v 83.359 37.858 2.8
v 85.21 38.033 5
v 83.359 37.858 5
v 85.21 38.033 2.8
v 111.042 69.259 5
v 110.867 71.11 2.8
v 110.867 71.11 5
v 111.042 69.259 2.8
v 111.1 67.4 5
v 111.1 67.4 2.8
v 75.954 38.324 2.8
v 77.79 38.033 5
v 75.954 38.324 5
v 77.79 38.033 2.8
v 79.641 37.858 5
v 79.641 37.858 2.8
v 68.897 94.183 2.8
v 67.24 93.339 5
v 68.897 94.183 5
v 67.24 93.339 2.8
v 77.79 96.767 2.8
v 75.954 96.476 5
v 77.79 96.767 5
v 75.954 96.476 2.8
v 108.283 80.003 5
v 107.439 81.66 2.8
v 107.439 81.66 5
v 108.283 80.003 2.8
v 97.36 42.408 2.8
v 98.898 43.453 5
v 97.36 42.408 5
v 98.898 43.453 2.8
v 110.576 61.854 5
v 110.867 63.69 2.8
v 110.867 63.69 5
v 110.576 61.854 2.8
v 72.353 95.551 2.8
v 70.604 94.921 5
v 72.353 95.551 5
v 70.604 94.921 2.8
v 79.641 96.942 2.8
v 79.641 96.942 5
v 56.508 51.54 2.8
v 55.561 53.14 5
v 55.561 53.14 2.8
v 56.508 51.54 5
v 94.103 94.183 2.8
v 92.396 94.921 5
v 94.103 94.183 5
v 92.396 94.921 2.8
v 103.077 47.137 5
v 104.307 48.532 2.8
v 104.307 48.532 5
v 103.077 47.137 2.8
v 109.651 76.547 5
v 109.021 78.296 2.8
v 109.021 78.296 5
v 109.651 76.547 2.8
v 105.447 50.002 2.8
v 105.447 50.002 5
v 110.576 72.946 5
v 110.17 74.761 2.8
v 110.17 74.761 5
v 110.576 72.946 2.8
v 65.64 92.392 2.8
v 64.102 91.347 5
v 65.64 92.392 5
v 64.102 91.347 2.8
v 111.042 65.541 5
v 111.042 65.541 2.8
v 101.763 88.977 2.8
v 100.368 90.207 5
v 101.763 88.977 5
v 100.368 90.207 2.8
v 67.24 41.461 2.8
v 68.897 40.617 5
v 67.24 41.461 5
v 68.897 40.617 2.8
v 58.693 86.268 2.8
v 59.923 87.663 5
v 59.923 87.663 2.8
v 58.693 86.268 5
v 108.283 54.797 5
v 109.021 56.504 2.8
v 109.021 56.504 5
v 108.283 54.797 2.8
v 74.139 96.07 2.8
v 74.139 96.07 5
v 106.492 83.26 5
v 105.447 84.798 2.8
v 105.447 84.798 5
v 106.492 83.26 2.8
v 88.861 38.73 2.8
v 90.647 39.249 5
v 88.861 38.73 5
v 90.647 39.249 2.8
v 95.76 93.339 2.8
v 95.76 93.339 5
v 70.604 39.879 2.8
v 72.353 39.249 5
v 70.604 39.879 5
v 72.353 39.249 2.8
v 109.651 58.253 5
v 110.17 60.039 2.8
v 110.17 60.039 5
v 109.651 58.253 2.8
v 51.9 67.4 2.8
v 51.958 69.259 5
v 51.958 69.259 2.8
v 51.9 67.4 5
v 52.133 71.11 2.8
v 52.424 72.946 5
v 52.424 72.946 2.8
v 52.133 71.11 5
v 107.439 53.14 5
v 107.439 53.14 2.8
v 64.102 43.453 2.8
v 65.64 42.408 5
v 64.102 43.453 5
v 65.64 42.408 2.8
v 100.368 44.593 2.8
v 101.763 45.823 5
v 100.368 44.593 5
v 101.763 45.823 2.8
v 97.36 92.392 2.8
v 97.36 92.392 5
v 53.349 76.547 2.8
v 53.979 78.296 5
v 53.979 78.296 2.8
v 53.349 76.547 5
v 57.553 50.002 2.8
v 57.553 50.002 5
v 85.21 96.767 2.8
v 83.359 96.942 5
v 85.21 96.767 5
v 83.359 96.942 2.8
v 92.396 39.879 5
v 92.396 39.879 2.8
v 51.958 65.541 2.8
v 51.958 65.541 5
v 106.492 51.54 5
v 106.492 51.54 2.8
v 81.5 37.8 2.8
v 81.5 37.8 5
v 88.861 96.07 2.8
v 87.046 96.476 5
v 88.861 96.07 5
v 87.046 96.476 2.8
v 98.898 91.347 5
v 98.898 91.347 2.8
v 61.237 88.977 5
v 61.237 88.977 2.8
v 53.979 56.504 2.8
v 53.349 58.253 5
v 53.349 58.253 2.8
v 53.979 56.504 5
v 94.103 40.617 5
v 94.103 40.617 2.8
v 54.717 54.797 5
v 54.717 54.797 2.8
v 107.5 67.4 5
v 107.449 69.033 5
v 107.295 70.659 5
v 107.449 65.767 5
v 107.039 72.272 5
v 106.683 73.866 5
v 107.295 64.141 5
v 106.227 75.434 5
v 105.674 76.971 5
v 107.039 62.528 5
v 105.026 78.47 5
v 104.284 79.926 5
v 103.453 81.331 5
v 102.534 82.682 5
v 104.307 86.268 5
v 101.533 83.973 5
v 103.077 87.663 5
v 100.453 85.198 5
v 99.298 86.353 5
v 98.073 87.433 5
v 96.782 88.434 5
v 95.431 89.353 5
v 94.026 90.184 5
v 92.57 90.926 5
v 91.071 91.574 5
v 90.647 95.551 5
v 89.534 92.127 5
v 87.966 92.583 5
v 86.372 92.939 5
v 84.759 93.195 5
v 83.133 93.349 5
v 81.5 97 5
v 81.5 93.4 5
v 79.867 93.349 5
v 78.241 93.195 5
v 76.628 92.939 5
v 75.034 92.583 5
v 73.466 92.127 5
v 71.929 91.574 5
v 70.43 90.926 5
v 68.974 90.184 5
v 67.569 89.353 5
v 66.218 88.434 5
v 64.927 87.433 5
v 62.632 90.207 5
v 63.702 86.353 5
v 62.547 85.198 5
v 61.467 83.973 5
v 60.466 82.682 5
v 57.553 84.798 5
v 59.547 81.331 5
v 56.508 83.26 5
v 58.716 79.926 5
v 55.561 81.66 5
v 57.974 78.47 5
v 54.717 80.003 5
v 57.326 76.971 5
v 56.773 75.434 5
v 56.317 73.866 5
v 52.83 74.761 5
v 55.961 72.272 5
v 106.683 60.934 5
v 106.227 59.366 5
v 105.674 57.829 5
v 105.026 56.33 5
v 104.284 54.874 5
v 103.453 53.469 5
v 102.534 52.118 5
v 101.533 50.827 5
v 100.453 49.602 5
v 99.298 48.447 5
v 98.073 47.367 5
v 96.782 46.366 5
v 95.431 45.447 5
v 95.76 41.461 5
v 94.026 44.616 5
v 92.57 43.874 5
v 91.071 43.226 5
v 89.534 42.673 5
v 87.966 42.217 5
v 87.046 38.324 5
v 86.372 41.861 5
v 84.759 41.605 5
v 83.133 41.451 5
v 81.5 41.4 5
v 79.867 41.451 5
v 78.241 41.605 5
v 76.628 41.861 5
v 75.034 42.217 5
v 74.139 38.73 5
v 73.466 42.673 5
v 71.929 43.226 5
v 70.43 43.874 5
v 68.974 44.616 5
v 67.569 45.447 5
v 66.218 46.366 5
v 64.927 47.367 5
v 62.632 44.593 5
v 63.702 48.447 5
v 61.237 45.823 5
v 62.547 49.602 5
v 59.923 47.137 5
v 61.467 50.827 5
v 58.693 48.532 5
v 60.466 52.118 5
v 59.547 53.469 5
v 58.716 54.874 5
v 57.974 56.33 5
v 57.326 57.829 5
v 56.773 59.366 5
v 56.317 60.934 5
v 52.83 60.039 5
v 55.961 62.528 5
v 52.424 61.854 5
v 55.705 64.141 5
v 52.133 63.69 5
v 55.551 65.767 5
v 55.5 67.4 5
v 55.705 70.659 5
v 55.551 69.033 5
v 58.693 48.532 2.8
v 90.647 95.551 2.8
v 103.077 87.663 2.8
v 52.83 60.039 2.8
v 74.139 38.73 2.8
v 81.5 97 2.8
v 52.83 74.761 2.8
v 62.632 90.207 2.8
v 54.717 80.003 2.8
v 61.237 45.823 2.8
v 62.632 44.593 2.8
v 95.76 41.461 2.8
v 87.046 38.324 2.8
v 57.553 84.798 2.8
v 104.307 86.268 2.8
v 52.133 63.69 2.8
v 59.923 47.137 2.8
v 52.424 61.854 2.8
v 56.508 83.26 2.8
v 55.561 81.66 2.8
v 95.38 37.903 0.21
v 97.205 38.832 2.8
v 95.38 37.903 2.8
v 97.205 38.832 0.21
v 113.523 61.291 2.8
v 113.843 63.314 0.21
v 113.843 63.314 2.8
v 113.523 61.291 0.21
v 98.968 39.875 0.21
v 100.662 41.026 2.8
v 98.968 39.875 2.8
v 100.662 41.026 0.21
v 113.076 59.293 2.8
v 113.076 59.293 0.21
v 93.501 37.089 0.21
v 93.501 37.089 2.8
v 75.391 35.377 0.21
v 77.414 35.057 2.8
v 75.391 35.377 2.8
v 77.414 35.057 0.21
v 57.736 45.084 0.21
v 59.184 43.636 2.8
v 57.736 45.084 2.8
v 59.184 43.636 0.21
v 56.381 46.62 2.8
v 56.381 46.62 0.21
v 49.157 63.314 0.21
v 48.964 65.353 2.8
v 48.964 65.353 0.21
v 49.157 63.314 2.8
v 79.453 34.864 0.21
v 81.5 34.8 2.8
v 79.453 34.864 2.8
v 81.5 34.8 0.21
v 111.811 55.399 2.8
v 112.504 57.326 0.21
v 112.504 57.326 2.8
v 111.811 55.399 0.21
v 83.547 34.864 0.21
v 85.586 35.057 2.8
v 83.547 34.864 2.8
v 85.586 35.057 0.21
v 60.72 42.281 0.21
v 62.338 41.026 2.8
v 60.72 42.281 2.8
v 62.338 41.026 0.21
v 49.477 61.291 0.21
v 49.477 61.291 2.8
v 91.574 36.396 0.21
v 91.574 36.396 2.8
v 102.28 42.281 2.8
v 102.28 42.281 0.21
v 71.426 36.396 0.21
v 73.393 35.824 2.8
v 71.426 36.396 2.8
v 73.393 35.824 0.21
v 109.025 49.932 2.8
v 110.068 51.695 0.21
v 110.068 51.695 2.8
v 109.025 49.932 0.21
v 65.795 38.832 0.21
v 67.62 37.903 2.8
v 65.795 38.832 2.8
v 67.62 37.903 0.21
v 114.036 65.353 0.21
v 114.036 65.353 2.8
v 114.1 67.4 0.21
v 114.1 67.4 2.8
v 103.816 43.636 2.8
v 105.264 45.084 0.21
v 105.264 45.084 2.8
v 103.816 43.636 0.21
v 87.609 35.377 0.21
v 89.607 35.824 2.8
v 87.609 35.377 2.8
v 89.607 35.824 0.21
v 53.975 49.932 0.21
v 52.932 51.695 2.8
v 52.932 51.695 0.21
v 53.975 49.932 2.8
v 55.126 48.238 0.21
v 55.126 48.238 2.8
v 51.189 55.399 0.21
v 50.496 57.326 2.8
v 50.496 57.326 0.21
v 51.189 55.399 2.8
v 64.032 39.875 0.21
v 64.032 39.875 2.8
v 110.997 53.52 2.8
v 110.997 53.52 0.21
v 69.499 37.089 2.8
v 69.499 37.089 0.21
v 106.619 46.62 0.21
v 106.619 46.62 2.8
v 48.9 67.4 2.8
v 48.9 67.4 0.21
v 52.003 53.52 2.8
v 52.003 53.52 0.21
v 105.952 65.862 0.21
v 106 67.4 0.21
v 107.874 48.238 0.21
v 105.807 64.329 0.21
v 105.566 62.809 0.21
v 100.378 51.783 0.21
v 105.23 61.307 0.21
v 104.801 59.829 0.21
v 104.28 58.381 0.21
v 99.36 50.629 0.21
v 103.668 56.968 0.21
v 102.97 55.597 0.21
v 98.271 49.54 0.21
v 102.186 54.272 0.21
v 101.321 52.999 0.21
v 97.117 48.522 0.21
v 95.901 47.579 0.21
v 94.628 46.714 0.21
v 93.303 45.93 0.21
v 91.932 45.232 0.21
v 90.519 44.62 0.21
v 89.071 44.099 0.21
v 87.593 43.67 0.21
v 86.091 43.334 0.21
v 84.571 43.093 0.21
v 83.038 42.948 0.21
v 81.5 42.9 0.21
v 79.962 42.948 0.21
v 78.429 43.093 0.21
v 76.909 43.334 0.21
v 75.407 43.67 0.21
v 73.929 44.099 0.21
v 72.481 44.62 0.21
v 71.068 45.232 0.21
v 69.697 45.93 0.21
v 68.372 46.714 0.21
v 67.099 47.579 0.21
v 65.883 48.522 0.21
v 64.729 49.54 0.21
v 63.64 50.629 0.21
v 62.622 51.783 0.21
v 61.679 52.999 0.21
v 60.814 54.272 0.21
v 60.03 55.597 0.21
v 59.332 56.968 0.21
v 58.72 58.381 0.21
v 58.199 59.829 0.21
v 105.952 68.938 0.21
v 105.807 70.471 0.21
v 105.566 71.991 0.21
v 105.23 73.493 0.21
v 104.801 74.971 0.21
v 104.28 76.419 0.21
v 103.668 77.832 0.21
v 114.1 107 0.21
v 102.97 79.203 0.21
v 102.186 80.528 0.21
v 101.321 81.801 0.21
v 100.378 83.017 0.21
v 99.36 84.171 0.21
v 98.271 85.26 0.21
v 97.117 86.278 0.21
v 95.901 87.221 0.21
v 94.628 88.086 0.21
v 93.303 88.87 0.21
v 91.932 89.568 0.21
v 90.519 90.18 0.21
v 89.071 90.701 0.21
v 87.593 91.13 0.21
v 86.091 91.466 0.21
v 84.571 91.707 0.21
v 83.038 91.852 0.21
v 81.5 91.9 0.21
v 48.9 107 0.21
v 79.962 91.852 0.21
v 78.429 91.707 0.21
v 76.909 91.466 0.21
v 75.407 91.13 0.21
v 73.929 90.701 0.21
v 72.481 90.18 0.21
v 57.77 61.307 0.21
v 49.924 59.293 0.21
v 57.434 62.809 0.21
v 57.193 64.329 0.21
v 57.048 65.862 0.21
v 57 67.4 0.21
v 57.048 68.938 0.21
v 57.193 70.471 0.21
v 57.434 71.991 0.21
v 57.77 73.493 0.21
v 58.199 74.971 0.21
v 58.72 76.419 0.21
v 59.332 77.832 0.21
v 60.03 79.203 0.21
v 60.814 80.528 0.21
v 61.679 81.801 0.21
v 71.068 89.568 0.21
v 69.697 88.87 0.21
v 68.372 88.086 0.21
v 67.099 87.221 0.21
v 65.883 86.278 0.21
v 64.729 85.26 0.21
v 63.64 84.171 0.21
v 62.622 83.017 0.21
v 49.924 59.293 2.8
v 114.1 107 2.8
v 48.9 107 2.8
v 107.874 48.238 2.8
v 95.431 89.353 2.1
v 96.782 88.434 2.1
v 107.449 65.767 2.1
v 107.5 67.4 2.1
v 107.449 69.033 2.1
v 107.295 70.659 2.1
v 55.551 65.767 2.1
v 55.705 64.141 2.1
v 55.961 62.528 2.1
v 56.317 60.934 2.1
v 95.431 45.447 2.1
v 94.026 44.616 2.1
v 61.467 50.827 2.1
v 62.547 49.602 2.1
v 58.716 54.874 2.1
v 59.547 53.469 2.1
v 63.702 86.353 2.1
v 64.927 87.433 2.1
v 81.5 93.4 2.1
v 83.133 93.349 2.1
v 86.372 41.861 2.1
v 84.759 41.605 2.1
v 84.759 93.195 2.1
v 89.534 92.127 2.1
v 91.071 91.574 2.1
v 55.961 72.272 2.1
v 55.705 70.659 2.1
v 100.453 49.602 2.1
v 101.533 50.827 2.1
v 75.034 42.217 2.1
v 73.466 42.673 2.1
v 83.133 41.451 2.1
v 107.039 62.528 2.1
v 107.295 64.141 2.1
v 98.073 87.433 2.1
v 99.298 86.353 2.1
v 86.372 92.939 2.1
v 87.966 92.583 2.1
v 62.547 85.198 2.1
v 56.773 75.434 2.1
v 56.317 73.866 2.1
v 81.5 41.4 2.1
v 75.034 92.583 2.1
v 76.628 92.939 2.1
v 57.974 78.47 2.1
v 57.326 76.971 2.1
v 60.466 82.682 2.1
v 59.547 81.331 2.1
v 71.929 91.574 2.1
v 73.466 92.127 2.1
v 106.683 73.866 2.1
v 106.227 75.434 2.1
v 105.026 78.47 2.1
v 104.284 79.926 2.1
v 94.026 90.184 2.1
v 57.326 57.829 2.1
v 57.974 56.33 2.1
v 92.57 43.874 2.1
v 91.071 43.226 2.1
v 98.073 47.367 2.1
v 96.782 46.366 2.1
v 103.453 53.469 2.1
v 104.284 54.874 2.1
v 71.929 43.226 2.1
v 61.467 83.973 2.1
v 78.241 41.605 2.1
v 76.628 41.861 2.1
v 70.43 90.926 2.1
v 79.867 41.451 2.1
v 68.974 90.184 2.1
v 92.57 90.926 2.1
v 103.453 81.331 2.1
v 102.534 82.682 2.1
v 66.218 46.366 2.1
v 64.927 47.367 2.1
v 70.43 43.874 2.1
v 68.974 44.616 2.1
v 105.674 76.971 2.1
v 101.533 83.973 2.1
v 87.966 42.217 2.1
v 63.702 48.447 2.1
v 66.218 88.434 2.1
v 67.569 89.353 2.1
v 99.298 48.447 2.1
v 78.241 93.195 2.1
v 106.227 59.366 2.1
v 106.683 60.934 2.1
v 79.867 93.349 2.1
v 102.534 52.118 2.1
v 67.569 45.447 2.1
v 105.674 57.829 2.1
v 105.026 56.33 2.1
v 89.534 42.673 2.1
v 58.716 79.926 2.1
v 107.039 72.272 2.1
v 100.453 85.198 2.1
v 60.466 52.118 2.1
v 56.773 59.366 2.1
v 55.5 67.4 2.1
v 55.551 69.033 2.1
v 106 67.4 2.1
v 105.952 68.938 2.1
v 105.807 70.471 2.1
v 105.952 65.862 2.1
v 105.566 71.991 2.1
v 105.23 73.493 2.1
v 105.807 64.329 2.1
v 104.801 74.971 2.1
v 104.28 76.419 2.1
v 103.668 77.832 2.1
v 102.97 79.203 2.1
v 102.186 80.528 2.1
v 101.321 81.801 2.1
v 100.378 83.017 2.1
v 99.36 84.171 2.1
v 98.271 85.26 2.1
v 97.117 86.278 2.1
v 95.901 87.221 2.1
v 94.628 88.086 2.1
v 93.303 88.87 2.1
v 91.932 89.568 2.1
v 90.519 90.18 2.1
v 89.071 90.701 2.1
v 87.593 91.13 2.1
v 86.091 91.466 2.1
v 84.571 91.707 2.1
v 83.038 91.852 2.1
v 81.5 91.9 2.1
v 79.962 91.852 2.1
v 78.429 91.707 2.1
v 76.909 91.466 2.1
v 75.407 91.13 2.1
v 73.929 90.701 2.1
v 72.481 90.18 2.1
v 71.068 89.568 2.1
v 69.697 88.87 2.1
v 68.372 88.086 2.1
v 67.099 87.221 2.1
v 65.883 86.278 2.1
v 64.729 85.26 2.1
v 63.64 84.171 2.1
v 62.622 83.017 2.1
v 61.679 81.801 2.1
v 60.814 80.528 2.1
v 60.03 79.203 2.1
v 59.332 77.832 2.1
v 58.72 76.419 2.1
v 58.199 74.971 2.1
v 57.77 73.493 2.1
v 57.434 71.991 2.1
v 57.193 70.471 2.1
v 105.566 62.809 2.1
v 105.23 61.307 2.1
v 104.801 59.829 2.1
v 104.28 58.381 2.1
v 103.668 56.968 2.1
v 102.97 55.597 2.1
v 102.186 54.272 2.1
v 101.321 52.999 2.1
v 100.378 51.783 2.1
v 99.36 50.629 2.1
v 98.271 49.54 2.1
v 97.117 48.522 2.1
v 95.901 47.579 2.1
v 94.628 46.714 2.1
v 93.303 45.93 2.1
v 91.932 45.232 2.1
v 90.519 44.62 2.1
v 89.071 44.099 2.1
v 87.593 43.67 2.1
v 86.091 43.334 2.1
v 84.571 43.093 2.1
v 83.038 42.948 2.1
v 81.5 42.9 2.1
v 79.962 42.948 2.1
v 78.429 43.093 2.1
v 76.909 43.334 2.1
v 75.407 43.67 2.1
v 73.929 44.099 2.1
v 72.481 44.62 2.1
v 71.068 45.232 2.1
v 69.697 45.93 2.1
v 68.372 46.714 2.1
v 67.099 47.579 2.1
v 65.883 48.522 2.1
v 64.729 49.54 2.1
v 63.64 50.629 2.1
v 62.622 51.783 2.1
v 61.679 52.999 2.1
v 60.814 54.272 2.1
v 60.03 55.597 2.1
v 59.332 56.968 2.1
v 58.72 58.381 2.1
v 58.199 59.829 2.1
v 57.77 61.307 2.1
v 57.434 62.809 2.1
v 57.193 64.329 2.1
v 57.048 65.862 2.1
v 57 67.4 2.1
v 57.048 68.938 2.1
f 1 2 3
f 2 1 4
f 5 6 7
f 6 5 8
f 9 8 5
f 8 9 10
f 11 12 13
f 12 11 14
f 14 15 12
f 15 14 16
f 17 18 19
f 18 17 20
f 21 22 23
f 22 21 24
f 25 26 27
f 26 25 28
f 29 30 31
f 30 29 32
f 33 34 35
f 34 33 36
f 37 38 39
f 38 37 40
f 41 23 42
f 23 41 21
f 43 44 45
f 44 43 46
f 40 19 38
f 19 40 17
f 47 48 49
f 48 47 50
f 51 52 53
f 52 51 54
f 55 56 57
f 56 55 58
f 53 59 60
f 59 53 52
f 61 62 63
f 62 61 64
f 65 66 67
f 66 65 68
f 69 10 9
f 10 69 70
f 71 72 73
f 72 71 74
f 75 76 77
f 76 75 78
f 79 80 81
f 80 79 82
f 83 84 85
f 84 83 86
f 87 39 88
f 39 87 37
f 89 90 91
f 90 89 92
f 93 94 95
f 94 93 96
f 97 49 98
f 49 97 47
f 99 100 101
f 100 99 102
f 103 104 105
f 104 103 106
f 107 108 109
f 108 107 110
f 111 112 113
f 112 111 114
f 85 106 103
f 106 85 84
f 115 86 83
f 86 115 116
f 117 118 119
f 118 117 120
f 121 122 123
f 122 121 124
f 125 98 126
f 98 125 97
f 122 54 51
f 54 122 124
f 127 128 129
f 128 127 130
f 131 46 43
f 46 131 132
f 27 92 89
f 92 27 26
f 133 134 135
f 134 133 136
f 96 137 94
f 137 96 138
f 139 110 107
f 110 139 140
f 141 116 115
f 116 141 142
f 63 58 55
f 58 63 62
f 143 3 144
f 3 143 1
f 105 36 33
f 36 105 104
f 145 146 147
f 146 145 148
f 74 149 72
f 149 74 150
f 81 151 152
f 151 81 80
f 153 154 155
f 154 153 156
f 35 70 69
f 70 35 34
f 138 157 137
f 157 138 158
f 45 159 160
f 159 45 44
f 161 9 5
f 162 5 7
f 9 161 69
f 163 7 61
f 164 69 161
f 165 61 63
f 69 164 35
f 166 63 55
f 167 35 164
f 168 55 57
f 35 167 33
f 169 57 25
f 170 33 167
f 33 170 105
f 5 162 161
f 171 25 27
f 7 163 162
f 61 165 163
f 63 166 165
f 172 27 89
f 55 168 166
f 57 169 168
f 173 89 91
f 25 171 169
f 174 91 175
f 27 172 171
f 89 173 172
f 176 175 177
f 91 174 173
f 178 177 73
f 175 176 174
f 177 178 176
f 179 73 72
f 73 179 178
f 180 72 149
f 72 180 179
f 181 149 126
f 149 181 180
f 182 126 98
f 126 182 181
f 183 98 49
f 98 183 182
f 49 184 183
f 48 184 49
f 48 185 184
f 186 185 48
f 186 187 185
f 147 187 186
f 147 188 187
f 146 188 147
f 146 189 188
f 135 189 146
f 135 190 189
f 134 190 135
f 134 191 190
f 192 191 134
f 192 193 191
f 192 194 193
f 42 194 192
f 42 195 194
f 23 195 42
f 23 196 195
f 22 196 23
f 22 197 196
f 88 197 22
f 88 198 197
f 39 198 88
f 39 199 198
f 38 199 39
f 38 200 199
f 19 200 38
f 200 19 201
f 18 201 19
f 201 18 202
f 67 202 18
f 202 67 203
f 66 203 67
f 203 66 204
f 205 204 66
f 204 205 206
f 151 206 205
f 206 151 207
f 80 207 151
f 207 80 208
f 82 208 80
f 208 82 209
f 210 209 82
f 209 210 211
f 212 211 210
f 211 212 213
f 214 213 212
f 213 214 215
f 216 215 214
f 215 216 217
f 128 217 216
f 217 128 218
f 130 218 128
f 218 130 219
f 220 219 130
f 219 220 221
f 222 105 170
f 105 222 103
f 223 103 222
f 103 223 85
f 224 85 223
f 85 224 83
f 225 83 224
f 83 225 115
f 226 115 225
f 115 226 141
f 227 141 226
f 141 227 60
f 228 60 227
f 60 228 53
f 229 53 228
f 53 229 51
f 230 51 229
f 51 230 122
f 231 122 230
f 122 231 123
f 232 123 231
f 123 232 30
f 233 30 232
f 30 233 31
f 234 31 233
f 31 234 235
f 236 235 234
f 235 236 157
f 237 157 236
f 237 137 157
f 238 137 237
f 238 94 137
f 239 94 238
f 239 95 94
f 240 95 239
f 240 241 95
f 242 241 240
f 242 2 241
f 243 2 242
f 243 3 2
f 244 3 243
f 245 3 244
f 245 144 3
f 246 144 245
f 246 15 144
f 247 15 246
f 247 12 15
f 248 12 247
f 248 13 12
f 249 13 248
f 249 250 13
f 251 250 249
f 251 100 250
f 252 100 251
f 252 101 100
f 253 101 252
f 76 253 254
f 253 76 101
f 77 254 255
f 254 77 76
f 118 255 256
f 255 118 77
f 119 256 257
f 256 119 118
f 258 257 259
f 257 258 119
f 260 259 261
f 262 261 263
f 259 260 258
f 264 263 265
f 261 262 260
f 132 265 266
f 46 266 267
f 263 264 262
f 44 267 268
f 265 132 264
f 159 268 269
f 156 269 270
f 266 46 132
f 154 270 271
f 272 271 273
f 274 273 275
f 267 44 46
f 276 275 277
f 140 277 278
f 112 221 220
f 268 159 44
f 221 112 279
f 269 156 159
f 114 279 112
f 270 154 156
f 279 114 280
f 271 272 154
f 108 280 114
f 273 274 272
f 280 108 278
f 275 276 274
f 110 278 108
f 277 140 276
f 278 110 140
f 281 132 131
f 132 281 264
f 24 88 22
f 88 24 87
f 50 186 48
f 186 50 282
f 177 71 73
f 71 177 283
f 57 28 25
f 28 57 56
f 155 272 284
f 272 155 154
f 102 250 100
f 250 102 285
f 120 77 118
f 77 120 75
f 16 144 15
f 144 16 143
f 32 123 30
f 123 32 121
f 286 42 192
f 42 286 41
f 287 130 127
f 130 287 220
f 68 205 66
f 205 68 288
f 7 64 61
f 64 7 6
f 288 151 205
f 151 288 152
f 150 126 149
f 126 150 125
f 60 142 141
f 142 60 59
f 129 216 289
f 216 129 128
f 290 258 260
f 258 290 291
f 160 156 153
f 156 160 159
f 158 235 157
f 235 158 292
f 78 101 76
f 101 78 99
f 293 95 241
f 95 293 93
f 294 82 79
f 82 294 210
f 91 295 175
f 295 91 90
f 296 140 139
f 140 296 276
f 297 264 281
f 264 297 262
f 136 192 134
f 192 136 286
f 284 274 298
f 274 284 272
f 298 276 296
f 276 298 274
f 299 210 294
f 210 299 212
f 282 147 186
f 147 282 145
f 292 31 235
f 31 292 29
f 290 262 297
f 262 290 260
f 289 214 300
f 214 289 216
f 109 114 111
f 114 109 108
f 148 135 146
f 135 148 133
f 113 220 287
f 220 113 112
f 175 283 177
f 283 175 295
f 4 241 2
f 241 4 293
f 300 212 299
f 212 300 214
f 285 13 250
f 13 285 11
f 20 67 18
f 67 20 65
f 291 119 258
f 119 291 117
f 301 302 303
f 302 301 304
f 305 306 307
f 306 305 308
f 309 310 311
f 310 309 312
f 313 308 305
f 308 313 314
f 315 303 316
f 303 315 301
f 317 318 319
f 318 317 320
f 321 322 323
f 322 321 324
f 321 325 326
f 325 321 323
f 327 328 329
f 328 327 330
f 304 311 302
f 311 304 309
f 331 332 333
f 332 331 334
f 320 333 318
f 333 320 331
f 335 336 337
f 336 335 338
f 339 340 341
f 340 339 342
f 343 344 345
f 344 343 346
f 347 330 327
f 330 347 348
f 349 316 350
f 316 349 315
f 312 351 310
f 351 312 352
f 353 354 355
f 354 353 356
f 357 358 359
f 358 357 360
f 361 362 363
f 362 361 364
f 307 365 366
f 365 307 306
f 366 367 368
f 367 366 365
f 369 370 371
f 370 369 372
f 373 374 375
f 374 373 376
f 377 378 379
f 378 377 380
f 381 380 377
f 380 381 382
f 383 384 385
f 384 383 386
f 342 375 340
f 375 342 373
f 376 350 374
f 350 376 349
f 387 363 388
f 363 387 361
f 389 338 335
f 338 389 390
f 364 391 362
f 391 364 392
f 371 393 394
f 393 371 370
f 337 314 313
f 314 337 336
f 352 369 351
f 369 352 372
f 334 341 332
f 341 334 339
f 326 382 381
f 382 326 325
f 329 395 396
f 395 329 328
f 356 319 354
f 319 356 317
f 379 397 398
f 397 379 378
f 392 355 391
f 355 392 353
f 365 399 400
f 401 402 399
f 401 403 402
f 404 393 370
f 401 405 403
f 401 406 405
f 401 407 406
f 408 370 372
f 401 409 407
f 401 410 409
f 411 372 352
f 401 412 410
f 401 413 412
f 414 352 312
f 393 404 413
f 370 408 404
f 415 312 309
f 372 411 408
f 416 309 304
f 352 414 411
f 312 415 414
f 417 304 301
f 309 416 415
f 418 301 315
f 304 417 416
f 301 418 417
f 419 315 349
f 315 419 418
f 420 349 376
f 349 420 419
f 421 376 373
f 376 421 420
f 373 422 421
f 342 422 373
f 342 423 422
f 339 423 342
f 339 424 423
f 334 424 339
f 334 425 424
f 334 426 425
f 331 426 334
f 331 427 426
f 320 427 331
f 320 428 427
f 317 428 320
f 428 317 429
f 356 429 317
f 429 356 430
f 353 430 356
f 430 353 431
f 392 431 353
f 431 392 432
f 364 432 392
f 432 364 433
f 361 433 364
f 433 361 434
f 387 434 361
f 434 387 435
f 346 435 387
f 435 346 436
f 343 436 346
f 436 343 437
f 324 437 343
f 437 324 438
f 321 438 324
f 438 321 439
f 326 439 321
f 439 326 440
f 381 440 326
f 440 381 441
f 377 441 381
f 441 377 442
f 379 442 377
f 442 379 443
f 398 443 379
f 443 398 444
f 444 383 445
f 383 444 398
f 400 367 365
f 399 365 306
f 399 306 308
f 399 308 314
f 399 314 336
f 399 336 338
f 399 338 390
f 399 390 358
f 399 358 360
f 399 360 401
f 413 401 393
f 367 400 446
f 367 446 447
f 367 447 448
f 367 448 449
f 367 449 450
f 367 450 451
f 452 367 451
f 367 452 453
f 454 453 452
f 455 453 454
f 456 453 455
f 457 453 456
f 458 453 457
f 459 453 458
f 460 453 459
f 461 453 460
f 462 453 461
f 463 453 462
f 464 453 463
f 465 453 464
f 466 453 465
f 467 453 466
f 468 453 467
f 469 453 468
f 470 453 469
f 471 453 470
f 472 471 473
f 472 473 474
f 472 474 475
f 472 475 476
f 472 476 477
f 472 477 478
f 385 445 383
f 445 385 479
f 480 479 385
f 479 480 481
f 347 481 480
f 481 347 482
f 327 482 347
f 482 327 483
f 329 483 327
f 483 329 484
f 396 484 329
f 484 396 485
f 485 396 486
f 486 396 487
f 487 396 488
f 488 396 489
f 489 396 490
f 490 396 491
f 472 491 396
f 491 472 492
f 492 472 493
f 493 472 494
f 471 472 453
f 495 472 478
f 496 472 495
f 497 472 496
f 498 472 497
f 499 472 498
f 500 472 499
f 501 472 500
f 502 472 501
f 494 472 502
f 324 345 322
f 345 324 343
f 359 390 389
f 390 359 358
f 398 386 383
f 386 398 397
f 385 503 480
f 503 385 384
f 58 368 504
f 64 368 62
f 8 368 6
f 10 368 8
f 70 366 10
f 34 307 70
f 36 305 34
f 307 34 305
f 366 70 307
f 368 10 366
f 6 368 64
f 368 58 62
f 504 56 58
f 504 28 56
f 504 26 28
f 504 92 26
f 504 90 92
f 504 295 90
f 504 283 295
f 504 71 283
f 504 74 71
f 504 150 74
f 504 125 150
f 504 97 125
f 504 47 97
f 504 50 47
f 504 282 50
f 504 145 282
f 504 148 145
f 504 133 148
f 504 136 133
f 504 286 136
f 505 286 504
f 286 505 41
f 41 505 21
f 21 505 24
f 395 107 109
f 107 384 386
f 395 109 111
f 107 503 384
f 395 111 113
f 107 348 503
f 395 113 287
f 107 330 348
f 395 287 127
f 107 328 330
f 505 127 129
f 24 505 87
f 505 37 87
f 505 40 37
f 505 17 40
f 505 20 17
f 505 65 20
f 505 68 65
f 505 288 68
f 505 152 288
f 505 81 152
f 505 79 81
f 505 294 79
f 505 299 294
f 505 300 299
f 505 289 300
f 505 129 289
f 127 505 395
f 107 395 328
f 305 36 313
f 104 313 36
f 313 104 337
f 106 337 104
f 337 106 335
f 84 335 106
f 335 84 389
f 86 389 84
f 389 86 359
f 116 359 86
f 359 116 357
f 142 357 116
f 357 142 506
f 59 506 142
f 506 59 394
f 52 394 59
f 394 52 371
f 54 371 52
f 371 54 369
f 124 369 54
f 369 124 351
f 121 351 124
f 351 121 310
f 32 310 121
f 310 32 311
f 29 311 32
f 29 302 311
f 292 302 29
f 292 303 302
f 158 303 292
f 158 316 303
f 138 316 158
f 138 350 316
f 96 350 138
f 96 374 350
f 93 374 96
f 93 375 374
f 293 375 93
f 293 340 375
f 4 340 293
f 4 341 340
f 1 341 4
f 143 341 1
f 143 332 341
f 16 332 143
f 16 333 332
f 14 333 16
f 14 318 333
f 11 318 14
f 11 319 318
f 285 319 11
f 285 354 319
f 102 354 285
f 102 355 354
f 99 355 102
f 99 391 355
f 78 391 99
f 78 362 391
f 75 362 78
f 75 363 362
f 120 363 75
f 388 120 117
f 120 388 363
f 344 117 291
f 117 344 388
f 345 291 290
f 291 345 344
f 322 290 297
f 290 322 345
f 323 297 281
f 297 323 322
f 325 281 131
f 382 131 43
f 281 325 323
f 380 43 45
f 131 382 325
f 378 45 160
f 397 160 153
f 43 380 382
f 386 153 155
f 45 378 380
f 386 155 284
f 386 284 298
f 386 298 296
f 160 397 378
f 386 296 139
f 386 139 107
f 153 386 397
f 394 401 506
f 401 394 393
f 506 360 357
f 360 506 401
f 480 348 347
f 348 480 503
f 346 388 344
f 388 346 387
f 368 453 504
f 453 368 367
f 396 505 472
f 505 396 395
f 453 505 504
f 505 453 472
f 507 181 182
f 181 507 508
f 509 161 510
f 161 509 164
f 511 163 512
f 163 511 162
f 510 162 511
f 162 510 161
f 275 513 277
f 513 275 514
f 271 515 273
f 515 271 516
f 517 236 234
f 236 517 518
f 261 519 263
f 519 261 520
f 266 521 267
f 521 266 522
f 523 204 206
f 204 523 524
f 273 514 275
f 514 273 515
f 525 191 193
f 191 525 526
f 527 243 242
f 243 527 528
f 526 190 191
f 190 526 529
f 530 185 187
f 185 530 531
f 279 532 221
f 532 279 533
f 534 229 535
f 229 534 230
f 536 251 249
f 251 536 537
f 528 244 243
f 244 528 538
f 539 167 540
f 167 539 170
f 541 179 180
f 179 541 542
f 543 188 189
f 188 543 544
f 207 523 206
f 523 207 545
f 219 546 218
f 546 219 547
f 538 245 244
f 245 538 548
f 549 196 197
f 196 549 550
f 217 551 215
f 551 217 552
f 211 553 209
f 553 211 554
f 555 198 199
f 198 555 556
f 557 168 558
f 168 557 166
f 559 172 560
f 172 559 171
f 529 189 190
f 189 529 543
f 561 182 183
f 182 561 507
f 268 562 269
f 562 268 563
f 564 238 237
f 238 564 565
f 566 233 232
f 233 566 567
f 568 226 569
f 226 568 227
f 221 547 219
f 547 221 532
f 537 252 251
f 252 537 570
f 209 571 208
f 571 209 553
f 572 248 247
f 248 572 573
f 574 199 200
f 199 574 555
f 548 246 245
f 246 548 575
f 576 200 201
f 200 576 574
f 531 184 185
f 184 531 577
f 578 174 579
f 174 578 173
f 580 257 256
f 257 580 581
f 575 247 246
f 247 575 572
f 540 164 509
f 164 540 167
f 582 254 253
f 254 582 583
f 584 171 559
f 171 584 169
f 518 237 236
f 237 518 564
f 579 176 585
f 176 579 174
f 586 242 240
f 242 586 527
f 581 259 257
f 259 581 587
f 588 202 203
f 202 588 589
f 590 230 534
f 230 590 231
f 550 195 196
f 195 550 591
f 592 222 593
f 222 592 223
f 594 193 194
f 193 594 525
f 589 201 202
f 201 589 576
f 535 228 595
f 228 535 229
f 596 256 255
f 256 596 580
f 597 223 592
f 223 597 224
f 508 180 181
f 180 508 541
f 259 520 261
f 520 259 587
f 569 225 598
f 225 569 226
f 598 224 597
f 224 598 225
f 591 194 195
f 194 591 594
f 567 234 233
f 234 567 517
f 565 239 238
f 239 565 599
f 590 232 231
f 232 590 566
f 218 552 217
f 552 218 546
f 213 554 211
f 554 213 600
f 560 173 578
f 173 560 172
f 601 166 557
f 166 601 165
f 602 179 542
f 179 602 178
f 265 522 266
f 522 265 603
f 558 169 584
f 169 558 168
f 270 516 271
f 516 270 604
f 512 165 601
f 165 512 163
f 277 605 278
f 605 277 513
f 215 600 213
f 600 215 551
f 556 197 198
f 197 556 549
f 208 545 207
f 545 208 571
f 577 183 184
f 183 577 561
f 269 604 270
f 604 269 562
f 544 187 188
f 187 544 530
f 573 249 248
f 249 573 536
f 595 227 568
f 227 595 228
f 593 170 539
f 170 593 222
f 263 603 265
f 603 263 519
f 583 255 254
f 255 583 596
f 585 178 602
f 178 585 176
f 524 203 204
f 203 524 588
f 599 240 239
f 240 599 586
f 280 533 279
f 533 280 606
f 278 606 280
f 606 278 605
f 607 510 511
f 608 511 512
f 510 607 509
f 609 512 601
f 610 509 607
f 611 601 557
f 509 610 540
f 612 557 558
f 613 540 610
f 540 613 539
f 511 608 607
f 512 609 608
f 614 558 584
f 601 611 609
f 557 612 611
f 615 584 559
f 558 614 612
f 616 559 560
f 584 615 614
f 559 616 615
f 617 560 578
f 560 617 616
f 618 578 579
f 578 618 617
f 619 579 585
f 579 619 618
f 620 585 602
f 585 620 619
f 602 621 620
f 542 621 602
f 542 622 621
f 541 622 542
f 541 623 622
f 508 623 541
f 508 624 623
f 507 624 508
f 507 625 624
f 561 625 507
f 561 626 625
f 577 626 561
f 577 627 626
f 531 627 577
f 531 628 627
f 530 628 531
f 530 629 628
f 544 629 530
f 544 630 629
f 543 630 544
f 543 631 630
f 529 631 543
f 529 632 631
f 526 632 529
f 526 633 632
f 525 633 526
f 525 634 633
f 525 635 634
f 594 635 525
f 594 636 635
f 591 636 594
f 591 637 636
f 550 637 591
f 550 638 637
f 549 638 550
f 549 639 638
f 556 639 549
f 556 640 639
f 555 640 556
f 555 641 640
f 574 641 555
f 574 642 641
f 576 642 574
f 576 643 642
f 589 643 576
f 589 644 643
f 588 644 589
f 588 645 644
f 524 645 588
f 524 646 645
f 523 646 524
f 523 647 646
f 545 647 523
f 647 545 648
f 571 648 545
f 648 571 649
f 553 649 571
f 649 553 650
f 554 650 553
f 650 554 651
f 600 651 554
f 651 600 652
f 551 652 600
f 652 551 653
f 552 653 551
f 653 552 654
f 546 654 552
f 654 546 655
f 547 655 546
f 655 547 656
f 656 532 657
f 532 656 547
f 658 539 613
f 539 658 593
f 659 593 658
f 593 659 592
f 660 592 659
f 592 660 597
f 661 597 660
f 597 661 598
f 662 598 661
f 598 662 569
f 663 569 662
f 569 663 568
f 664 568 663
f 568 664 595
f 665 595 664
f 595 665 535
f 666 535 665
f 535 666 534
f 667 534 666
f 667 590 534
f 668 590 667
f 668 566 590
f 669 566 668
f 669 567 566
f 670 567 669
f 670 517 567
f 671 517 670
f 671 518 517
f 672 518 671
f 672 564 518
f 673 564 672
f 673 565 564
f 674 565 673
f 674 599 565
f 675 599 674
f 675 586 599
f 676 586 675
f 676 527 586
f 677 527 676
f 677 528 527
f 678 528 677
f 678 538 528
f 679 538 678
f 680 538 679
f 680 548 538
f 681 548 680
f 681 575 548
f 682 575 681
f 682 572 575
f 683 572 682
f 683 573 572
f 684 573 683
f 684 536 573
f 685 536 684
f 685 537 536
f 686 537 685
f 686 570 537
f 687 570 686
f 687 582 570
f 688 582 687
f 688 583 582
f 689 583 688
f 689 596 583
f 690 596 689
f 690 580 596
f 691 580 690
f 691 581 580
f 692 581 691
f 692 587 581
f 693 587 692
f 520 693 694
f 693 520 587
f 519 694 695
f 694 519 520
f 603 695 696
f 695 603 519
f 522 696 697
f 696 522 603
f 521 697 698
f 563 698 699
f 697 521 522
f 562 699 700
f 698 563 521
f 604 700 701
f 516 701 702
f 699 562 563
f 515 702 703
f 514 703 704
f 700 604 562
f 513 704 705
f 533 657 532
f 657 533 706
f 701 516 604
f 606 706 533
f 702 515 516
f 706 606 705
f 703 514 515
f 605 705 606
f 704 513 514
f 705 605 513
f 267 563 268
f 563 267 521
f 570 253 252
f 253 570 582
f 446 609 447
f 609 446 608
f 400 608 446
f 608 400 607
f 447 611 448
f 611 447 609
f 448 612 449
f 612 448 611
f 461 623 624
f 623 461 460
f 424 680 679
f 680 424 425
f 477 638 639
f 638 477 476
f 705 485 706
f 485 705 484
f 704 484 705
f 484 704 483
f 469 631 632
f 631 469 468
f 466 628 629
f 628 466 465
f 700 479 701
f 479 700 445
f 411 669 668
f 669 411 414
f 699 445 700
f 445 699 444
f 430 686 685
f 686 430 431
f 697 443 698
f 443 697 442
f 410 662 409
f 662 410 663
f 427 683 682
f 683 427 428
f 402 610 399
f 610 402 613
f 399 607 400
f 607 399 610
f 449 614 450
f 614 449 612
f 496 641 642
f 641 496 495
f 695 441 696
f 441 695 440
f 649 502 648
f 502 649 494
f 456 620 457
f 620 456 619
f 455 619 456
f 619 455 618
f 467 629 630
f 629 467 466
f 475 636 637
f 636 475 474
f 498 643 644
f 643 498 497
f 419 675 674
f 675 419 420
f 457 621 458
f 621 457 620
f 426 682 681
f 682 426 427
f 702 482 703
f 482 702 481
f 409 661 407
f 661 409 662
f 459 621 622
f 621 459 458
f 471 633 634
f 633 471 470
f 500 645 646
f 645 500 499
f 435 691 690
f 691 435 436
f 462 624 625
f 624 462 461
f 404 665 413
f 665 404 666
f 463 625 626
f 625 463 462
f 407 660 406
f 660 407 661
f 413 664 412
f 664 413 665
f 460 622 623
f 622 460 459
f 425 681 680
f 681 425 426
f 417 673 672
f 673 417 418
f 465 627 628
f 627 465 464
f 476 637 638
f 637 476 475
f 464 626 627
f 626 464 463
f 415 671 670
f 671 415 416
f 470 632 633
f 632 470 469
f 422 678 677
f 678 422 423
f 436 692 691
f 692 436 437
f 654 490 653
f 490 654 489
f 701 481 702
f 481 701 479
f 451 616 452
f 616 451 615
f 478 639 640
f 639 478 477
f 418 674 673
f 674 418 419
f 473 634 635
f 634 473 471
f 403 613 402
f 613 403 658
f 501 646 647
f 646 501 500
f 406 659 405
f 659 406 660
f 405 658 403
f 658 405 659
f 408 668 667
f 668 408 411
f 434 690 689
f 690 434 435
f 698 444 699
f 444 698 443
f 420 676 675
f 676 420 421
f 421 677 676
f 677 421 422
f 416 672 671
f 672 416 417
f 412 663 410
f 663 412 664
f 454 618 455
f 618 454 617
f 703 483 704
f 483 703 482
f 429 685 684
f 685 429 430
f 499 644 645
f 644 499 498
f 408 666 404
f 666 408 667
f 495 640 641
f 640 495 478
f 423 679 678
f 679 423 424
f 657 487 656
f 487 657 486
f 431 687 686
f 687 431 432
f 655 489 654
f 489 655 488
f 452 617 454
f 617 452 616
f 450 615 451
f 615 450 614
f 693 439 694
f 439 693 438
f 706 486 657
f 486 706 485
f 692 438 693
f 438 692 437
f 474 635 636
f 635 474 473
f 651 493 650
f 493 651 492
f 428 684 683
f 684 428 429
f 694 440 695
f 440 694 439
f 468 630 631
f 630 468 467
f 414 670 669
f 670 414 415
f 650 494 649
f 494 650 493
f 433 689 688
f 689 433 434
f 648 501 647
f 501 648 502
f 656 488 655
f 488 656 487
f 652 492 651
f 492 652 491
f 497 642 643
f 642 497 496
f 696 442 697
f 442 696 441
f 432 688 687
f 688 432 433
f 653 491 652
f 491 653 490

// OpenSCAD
bw=153;
bh=118;
td=116;
thick=2.35;
bthick=7;
rr=3;
bd=80;
glassthick=3.2;
bd2=bd+thick*2;
lens_adapter_dias=[79.2,60,66];
lenspos=[bw/2+5,bh/2+.4+8];
lensod=52;
camoff=[0,-35,-57];
main();
!mirror([0,0,1])
  lens_attach();
//!rotate([90,0])
*cam_base();
*cam_prop();
*tripod_square_mount();
//!mirror([0,0,1])
  lens_adapter();
*rotate([-90,0])
  phone_holder();
*!phone_slide();
module cam_base()
{
  translate(lenspos) translate(camoff) rotate([90,0])
    union() {
      difference() {
      translate([bw*-.5,50,25]) {
        translate([-4,0]) cube([bw+8,6,15]);
        translate([0,0,8]) cube([bw,15,7]);
        for(x=[-10,bw-5]) translate([x,0,8]) {
          cube([15,123,7]);
          translate([x<0?0:8,0,-8]) cube([7,123,10]);
        }
      }
          rotate([-90,0]) translate([bw*-.5+5,-30,67])
      phone_holes();
    }
      difference() {
        union() {
          *cylinder(d=6.35,h=6,$fn=30);
          
          translate([-10,-30,25]) cube([20,85,15]);
        }
        translate([0,0,24]) {
          linear_extrude(17.2,convexity=4) hull() {
            translate([0,-20]) circle(d=7,$fn=40);
            translate([0,40]) circle(d=7,$fn=40);
          }
        }
      }
      *rotate([-90,0]) translate([bw*-.5+5,-30,67])
        phone_holes();

    }
}
module cam_prop()
{
  translate(lenspos) translate(camoff) rotate([90,0])
  {
    *%cylinder(d=6.35,h=10,$fn=40);
    translate([-20,-20]) difference() {
      translate([0,0,15])  cube([40,40,34]);
      translate([9,-.1,23]) cube([22,41,18]);
      for(z=[17.01,40.99]) translate([20,20,z]) rotate([0,0,30]) cylinder(d=13,h=6,$fn=6);
      translate([20,20,0]) cylinder(d=7,h=82,$fn=50);
      translate([20,34.2,15]) sphere(d=4,$fn=50);
    }
  }
}
module phone_holder()
{
  difference() {
    translate([10,-10,10]) 
      cube([bw-10,3,106]);
    translate([10+thick,-10.1,20])
      cube([bw-10-thick*2,2,86]);
    translate([20,-10.1,10+thick])
      cube([bw-30,2,106-thick*2]);
    translate([10,-.1,10]) phone_holes();
  }
}
module phone_slide()
{
 mirrorx(bw/2+5) translate([5.3,7.6,15]) {
     rotate([0,0]) linear_extrude(100) {
       *polygon([[0,thick*2-1.2],[5,thick*2-1.2],[5,0],[0,3]]);
       square([5,thick*2-1.2]);
     }
   }
   translate([10.3,1.8,7.4])
    difference() {
      cube([bw-10.3,5+thick*2-.4,107.6]);
      translate([10,-.1,5]) cube([bw-30.3,20,95]);
    phone_holes() translate([0,0,4]) {
      cylinder(d=4,h=20,$fn=24);
      translate([0,0,13]) cylinder(d=7,h=5,$fn=40);
    }
   }
}
module phone_holes(xo=0) {
for(x=[5-xo,bw-15.3+xo],z=[5,100]) translate([x,-12,z]) rotate([-90,0]) {
  if($children>0)
    children();
  else
    cylinder(d=4,h=16,$fn=24);
}
}
module lens_attach()
{
  od3=lens_adapter_dias[2];
  translate(lenspos) {
    difference() {
      union() {
        translate([0,0,-5]) cylinder(d=lens_adapter_dias[1]-.8,h=4.59,$fn=100);
        translate([0,0,-2.8]) cylinder(d=od3-.8,h=2.59,$fn=100);
        translate([od3*-.5+.4,0,-2.8]) cube([od3-.8,lens_adapter_dias[0]/2,2.59]);
      }
      translate([0,0,-5.1]) cylinder(d=lensod,h=3,$fn=100);
      translate([0,0,-2.11]) cylinder(d=lensod-3,h=5,$fn=100);
    }
  }
}
module lens_adapter()
{
  od1=lens_adapter_dias[0];
  od2=lens_adapter_dias[1];
  od3=lens_adapter_dias[2];
  adthick=4.99;
  if(false) {
    translate(lenspos)
    translate([0,0,-2]) intersection() {
      cylinder(d=od1,h=2,$fn=100);
      difference() {
        union() {
          cylinder(d=od3-.8,h=2,$fn=100);
          translate([od3*-.5+.4,0]) cube([od3-.8,od3,2]);
        }
        translate([0,0,-.1]) cylinder(d=od2,h=20,$fn=100);
      }
    }
  }
  if(true) {
  *%lens_attach();
  translate(lenspos) {
    intersection() {
      translate([0,0,-5.01]) {
        *cylinder(d=100,h=4.99,$fn=100);
      }
      difference() {
      union() {
        translate([0,0,-5]) cylinder(d=od1,h=adthick,$fn=100);
        translate([od1*-.5,0,-5]) cube([od1,od1/2,adthick]);
        *translate([0,0,thick+.2]) cylinder(d=bd2+thick*2,h=bthick,$fn=100);
      }
      translate([0,0,-5.1]) cylinder(d=od2,h=19,$fn=100);
      translate([od2*-.5,0,-5.1]) cube([od2,40,3]);
      translate([0,0,-3]) cylinder(d=od3,h=3,$fn=100);
      translate([od3*-.5,0,-3]) cube([od3,od3,3]);
      adapter_holes();
      translate([0,0,thick+.2]) linear_extrude(thick) difference() {
        circle(d=bd2+.4,$fn=100);
        circle(d=bd-.8,$fn=100);
      }
      translate([0,0,-.01]) cylinder(d=lensod-2.2,h=bthick+thick+2,$fn=100);
      cylinder(d=lensod,h=7,$fn=100);
    }
  }
  }
}
}
module tripod_square_mount() {
  difference() {
  rotate([0,0,45]) {
    cylinder(d1=30,d2=40,h=5,$fn=4);
    translate([0,0,5]) cylinder(d=40,h=2,$fn=4);
  }
  translate([0,0,-.01]) {
    cylinder(d=7,h=10,$fn=40);
    translate([0,0,1]) rotate([0,0,30]) cylinder(d=13,h=8,$fn=6);
  }
}
}
module adapter_holes() {
  od1=lens_adapter_dias[0];
  od2=lens_adapter_dias[1];
  od3=lens_adapter_dias[2];
  hox=(od1-(od1-od3)/2)/2;
  translate([hox,35,-5.2]) cylinder(d=3,h=20,$fn=20);
  translate([-hox,35,-5.2]) cylinder(d=3,h=20,$fn=20);
  for(r=[0,-45,-90,-135,180]) rotate([0,0,r]) translate([hox,0,-5.2]) cylinder(d=3,h=20,$fn=20);
}
module main() {
  od1=lens_adapter_dias[0];
  od2=lens_adapter_dias[1];
  od3=lens_adapter_dias[2];
difference() {
  translate([5-thick,0.1]) cube2([bw+thick*2,bh+3,td]);
  *translate([-.1,0]) rotate([45,0]) cube([180.2,180.2,150]);
  *translate([-.1,3,50]) rotate([30,0]) cube([180.2,180.2,1520]);
  translate([20,0,bthick]) cube([bw-30,7,150]);
  translate([10,10,bthick+5]) cube([bw-10,10,150]);
  translate([5,3,bthick]) difference() {
    cube([bw,4,150]);
    mirrorx(152.7/2) difference() {
      cube([20,4,9]);
      translate([10,-.1,8]) rotate([-90,0]) rotate([0,0,30]) cylinder(d=7.2,h=4,$fn=6);
    }
  }
  translate([10,0,10]) phone_holes(0);
  difference() {
    translate([5+thick,15,thick]) cube2([bw-thick*2,bh-12-thick,150]);
    *translate(lenspos) cylinder(d=bd2,h=bthick,$fn=100);
  }
  translate([5,10,6]) rotate([45,0]) translate([0,2.6]) cube([bw,bw,glassthick]); // main glass
  intersection() {
    difference() {
      translate([5,3,thick]) 
        cube([bw,bh-thick,150]);
      translate(lenspos) cylinder(d=bd2,h=bthick,$fn=100);
    }
    union() {
      translate([5,10,6]) rotate([45,0]) difference() {
        translate([0,2.6,-100]) cube([153,158,190]);
        *rotate([-45,0]) translate([0,bh-9.4,-6]) cube([bw+thick*2,thick,td-4.5]);
        translate([-1,-1,0]) mirror([0,0,1]) translate([0,2.6]) cube([bw+2,158,thick*2]);
        *translate([-1,-1,-101]) cube([155,155,80]);
        translate([-1,-20]) rotate([-45,0]) {
          *cube([155,11,150]);
          rotate([90,0]) rotate([0,90,0]) linear_extrude(155,convexity=5) {
            square([5,150]);
            //polygon([[0,0],[12,0],[12,28],[12,150],[0,150]]);
          }
        }
        translate([-1,-1,glassthick]) cube([155,155,thick*2]);
      }
    }
  } 
  translate(lenspos)
    adapter_holes();

  translate([0,0,-.1]) translate(lenspos) cylinder(d=lens_adapter_dias[1],h=20,$fn=100);
  *translate([5,4+thick,15]) cube([153,5,200]);
}
}

module cube3(dims,r=rr) {
  minkowski() {
    translate([r,r]) cube([dims[0]-r*2,dims[1]-r*2,dims[2]]);
    for(m=[0,1]) mirror([0,0,m]) cylinder(r1=r,r2=0,h=r,$fn=4);
  }
}

module cube2(dims,r=rr)
{
  linear_extrude(dims[2]) {
    translate([r,0]) square([dims[0]-r*2,dims[1]]);
    translate([0,r]) square([dims[0],dims[1]-r*2]);
    for(x=[r,dims[0]-r],y=[r,dims[1]-r]) translate([x,y]) circle(r=r,$fn=r*4);
  }
}
module mirrorx(offset=0)
{
  translate([offset,0]) for(m=[0,1]) mirror([m,0]) translate([offset*-1,0]) children();
}
